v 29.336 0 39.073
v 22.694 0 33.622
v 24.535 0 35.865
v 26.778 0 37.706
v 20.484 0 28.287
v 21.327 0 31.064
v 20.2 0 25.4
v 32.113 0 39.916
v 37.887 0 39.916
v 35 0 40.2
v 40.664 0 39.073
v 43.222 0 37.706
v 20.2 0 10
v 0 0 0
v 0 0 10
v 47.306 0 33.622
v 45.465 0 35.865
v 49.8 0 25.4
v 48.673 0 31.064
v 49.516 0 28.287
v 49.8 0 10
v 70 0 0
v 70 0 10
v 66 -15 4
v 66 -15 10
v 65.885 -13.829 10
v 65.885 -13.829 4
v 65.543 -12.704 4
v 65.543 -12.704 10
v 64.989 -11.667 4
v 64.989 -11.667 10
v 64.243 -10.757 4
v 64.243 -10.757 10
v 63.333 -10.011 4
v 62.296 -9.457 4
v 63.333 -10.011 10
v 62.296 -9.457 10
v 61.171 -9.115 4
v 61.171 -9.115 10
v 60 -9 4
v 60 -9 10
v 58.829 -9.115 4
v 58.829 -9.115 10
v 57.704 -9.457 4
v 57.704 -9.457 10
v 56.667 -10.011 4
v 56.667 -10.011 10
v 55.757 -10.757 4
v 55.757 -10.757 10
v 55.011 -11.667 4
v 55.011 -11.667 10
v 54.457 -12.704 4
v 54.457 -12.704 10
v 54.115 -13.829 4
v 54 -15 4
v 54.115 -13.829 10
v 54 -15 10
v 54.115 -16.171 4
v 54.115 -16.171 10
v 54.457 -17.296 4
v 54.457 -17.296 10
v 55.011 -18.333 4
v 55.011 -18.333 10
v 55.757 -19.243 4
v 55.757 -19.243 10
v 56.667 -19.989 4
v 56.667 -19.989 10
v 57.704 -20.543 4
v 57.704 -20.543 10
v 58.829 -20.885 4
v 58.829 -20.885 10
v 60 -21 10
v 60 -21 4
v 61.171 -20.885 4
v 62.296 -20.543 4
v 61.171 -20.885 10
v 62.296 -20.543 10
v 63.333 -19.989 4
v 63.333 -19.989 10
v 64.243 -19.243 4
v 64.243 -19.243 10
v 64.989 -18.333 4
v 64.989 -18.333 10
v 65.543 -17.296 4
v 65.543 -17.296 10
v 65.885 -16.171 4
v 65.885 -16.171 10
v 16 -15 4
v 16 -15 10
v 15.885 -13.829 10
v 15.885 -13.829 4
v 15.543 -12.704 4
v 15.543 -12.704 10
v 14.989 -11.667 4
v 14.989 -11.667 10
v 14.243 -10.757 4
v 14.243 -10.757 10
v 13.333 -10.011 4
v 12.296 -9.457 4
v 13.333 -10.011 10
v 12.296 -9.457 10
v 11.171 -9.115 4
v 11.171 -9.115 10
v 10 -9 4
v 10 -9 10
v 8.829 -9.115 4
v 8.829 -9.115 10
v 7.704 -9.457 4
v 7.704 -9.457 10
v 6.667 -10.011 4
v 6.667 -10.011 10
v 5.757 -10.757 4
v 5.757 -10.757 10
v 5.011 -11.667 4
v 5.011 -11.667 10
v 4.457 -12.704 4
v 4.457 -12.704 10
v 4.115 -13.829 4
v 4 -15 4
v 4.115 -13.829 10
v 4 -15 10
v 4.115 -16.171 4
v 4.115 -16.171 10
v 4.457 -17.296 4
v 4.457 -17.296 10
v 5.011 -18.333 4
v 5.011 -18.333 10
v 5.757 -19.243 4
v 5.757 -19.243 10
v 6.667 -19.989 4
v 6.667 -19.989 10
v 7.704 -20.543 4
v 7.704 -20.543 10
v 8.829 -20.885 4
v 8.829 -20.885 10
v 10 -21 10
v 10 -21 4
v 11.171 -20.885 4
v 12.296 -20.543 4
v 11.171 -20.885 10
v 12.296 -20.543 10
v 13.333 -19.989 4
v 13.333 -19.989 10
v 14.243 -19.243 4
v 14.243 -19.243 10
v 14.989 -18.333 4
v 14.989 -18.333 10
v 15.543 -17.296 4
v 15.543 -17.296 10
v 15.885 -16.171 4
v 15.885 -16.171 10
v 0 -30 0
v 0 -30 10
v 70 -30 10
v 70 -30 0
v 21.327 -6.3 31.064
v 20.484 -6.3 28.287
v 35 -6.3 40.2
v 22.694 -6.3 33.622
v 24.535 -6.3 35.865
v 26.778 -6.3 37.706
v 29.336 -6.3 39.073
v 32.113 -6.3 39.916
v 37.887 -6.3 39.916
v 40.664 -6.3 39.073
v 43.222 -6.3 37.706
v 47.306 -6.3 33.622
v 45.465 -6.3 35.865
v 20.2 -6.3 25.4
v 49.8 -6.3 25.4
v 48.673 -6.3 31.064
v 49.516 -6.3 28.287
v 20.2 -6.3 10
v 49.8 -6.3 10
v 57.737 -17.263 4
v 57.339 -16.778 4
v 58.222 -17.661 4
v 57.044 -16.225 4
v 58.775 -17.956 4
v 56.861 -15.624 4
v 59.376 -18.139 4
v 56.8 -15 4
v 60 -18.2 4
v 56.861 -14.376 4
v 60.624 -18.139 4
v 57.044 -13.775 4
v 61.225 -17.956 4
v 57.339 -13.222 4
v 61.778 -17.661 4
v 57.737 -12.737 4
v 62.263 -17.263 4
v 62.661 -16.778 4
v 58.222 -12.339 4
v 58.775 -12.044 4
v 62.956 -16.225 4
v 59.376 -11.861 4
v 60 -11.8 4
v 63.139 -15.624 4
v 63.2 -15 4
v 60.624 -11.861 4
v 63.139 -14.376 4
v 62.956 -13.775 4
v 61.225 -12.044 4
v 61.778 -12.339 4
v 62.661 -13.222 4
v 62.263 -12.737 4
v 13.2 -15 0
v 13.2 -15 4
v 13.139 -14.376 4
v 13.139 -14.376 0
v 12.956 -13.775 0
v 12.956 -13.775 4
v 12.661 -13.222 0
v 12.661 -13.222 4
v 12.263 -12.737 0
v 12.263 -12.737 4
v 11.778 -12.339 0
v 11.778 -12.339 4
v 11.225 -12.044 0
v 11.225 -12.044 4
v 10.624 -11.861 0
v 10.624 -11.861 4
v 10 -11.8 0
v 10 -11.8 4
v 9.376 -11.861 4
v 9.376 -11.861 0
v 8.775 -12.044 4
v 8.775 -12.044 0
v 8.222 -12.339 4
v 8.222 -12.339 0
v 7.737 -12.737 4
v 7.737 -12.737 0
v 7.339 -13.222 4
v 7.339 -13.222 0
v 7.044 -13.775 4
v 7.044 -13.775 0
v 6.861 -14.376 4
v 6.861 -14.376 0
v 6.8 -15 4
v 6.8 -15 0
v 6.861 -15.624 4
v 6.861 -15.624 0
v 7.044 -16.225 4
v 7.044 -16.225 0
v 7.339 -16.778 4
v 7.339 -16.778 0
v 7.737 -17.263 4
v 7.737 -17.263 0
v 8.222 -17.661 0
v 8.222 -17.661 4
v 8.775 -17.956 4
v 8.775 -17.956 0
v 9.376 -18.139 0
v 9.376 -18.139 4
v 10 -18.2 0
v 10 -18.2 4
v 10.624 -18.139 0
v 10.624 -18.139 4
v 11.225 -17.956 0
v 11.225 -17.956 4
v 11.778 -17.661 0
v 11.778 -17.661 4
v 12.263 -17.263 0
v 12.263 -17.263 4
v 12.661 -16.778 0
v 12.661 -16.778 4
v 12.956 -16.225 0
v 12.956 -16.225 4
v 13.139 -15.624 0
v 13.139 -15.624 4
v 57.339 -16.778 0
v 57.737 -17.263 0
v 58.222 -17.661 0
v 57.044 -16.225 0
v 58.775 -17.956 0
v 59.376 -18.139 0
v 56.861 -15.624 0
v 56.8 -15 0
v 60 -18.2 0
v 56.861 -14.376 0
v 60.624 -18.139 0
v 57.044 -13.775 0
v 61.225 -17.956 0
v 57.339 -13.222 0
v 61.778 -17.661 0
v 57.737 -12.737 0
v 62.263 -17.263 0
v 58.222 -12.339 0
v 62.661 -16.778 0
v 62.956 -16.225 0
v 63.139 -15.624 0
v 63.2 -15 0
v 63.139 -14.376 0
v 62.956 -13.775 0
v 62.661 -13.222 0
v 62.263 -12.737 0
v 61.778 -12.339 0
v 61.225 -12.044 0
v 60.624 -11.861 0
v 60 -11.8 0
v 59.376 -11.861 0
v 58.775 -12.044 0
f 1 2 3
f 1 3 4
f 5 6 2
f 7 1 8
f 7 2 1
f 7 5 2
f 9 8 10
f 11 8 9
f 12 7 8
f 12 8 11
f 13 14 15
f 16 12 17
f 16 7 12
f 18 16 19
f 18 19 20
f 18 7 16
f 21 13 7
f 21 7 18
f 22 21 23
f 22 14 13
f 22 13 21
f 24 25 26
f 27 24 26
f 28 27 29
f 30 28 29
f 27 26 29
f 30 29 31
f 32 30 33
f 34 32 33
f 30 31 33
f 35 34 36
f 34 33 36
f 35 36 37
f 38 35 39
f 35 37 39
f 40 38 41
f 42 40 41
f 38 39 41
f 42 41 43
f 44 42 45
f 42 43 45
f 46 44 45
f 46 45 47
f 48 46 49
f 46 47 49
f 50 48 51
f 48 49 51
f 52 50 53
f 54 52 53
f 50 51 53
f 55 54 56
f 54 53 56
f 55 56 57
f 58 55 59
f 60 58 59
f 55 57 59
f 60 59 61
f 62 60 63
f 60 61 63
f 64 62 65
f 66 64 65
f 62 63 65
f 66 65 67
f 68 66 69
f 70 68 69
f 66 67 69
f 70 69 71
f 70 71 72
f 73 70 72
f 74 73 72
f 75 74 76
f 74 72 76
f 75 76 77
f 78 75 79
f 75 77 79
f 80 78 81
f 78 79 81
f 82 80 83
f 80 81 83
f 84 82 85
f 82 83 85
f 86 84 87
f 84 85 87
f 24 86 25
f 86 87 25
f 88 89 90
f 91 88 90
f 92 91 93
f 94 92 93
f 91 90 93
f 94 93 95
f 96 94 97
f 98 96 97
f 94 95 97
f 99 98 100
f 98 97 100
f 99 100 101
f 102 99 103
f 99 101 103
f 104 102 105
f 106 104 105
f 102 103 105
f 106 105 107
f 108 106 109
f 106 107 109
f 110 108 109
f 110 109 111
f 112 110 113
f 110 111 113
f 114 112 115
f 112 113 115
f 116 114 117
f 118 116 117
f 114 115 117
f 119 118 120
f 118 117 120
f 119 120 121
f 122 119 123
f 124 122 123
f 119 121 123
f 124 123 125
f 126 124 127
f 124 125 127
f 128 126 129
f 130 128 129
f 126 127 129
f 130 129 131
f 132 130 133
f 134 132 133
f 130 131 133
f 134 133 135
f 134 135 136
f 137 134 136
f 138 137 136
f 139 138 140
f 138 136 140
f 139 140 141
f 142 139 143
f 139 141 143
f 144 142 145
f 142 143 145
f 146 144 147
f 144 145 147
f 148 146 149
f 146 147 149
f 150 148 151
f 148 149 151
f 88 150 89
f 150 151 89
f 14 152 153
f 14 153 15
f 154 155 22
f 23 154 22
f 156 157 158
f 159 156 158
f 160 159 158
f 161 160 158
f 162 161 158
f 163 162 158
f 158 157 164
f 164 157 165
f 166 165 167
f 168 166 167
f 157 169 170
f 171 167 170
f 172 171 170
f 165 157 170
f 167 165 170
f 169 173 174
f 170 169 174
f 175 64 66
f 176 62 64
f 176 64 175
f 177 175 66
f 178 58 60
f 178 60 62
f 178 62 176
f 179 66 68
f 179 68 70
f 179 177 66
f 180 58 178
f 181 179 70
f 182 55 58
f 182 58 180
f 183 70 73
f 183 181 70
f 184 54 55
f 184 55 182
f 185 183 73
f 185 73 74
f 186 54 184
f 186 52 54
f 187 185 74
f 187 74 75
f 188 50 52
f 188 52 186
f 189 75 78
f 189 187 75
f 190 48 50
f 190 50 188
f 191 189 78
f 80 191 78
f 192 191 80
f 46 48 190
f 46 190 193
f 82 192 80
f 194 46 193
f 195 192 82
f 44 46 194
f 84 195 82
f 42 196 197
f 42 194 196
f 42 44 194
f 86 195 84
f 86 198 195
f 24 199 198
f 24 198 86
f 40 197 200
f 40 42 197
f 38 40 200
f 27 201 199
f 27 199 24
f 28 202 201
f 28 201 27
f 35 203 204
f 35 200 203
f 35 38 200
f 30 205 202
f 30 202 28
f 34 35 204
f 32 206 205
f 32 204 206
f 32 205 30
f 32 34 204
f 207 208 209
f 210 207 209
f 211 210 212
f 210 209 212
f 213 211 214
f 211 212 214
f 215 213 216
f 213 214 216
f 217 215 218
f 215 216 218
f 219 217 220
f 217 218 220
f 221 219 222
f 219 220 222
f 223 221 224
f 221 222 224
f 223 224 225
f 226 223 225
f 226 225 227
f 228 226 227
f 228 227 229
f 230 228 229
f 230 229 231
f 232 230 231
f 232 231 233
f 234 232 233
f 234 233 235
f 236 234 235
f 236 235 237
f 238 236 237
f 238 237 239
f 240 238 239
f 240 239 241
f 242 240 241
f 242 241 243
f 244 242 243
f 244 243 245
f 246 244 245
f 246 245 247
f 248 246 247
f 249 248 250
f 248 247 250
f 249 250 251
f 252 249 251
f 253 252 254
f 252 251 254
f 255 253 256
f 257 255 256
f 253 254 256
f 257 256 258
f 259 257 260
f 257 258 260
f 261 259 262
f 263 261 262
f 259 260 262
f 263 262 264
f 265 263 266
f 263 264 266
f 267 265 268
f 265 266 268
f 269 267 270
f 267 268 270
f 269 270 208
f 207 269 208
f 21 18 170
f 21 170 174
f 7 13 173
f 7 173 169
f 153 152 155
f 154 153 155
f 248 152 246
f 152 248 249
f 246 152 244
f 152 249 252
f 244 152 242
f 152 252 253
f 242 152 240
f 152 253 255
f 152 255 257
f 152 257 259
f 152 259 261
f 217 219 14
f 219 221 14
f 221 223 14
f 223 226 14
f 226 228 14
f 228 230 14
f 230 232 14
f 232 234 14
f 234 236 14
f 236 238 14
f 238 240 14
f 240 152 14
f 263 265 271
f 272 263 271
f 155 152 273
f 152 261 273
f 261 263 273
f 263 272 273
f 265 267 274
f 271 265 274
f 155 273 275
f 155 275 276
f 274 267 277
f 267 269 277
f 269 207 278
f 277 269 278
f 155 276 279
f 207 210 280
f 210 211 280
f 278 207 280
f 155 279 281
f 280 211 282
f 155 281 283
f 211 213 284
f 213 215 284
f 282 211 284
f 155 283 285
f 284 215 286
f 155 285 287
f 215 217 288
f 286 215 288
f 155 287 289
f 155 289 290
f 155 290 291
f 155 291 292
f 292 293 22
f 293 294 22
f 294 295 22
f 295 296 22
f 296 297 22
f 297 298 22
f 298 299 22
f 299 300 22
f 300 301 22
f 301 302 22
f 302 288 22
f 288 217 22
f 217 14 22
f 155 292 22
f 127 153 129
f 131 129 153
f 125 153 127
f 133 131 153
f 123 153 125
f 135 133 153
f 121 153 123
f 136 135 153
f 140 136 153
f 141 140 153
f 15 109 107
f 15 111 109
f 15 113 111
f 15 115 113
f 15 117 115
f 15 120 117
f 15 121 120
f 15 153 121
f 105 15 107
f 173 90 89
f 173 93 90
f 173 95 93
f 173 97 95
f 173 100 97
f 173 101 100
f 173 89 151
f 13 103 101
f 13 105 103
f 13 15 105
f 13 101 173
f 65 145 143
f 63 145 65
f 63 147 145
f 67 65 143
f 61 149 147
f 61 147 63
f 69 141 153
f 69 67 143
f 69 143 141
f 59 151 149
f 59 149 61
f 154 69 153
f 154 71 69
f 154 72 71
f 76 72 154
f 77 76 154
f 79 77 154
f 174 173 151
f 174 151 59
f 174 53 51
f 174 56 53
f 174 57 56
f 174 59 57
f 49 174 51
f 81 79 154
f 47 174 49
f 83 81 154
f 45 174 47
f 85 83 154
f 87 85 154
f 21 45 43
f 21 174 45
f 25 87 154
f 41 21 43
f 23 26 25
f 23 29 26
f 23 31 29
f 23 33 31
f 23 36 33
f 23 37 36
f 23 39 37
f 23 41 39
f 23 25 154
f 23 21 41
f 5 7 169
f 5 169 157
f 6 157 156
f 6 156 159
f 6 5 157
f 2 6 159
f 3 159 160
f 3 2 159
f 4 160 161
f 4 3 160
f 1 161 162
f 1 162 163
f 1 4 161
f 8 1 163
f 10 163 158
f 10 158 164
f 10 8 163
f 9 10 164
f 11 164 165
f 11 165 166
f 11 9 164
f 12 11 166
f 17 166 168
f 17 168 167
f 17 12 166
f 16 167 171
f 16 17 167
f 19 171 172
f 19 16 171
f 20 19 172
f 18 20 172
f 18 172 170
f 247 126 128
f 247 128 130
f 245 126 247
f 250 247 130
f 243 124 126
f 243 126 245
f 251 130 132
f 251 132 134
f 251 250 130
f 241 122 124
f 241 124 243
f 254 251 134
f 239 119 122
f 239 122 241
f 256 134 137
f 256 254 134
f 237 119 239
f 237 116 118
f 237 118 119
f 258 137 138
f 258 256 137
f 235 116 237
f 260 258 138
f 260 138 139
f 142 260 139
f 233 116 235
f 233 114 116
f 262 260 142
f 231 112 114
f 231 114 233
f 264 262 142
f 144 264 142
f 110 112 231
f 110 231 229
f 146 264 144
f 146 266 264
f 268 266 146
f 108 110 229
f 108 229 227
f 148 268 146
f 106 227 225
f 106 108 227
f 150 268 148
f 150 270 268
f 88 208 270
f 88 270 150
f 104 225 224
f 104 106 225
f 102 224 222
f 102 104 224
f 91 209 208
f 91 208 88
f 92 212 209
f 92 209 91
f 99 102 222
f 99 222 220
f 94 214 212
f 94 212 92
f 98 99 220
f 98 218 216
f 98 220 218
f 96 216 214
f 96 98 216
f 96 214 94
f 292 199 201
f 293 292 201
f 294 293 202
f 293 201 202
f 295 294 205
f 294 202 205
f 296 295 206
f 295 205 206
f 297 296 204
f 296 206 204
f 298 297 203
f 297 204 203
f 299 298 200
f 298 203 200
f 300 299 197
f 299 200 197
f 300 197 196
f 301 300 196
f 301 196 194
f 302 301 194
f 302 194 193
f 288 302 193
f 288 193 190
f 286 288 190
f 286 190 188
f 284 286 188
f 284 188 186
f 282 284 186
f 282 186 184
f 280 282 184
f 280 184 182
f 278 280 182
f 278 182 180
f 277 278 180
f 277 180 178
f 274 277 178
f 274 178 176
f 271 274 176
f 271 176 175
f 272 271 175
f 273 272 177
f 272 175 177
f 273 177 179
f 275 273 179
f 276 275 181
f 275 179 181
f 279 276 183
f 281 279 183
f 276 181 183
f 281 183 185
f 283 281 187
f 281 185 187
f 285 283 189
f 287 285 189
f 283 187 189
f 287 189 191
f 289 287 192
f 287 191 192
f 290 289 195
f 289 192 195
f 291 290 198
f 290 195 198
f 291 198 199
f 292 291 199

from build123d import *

# Parameters (mm, degrees)
SKETCH1_W           = 70
SKETCH1_H           = 30
BOSS_EXTRUDE1_DEPTH = 10
SKETCH2_R           = 6
CUT_EXTRUDE1_DEPTH  = 6
SKETCH3_R           = 3.2
CUT_EXTRUDE2_DEPTH  = 77.393717019
SKETCH9_R           = 14.8
BOSS_EXTRUDE3_DEPTH = 6.3


with BuildPart() as part:
    # Sketch1 → Boss-Extrude1 (new body)
    with BuildSketch(Plane.XY):
        with Locations((35, -15)):
            Rectangle(SKETCH1_W, SKETCH1_H)
    extrude(amount=BOSS_EXTRUDE1_DEPTH)

    # Sketch2 → Cut-Extrude1 (cut)
    with BuildSketch(Plane.XY.offset(10)):
        with Locations((10, -15)):
            Circle(SKETCH2_R)
        with Locations((60, -15)):
            Circle(SKETCH2_R)
    extrude(amount=-CUT_EXTRUDE1_DEPTH, mode=Mode.SUBTRACT)

    # Sketch3 → Cut-Extrude2 (cut, through all)
    with BuildSketch(Plane.XY.offset(4)):
        with Locations((10, -15)):
            Circle(SKETCH3_R)
        with Locations((60, -15)):
            Circle(SKETCH3_R)
    extrude(amount=-CUT_EXTRUDE2_DEPTH, mode=Mode.SUBTRACT)

    # Sketch9 → Boss-Extrude3 (add)
    with BuildSketch(Plane(origin=(0, 0, 0), x_dir=(1, 0, 0), z_dir=(0, 1, 0))):
        with Locations((35, -25.4)):
            Circle(SKETCH9_R)
        with BuildLine():
            Line((49.8, -25.4), (49.8, -10))
            Line((49.8, -10), (20.2, -10))
            Line((20.2, -10), (20.2, -25.4))
            ThreePointArc((20.2, -25.4), (35, -10.6), (49.8, -25.4))
        make_face()
    extrude(amount=-BOSS_EXTRUDE3_DEPTH)


solid = part.part
